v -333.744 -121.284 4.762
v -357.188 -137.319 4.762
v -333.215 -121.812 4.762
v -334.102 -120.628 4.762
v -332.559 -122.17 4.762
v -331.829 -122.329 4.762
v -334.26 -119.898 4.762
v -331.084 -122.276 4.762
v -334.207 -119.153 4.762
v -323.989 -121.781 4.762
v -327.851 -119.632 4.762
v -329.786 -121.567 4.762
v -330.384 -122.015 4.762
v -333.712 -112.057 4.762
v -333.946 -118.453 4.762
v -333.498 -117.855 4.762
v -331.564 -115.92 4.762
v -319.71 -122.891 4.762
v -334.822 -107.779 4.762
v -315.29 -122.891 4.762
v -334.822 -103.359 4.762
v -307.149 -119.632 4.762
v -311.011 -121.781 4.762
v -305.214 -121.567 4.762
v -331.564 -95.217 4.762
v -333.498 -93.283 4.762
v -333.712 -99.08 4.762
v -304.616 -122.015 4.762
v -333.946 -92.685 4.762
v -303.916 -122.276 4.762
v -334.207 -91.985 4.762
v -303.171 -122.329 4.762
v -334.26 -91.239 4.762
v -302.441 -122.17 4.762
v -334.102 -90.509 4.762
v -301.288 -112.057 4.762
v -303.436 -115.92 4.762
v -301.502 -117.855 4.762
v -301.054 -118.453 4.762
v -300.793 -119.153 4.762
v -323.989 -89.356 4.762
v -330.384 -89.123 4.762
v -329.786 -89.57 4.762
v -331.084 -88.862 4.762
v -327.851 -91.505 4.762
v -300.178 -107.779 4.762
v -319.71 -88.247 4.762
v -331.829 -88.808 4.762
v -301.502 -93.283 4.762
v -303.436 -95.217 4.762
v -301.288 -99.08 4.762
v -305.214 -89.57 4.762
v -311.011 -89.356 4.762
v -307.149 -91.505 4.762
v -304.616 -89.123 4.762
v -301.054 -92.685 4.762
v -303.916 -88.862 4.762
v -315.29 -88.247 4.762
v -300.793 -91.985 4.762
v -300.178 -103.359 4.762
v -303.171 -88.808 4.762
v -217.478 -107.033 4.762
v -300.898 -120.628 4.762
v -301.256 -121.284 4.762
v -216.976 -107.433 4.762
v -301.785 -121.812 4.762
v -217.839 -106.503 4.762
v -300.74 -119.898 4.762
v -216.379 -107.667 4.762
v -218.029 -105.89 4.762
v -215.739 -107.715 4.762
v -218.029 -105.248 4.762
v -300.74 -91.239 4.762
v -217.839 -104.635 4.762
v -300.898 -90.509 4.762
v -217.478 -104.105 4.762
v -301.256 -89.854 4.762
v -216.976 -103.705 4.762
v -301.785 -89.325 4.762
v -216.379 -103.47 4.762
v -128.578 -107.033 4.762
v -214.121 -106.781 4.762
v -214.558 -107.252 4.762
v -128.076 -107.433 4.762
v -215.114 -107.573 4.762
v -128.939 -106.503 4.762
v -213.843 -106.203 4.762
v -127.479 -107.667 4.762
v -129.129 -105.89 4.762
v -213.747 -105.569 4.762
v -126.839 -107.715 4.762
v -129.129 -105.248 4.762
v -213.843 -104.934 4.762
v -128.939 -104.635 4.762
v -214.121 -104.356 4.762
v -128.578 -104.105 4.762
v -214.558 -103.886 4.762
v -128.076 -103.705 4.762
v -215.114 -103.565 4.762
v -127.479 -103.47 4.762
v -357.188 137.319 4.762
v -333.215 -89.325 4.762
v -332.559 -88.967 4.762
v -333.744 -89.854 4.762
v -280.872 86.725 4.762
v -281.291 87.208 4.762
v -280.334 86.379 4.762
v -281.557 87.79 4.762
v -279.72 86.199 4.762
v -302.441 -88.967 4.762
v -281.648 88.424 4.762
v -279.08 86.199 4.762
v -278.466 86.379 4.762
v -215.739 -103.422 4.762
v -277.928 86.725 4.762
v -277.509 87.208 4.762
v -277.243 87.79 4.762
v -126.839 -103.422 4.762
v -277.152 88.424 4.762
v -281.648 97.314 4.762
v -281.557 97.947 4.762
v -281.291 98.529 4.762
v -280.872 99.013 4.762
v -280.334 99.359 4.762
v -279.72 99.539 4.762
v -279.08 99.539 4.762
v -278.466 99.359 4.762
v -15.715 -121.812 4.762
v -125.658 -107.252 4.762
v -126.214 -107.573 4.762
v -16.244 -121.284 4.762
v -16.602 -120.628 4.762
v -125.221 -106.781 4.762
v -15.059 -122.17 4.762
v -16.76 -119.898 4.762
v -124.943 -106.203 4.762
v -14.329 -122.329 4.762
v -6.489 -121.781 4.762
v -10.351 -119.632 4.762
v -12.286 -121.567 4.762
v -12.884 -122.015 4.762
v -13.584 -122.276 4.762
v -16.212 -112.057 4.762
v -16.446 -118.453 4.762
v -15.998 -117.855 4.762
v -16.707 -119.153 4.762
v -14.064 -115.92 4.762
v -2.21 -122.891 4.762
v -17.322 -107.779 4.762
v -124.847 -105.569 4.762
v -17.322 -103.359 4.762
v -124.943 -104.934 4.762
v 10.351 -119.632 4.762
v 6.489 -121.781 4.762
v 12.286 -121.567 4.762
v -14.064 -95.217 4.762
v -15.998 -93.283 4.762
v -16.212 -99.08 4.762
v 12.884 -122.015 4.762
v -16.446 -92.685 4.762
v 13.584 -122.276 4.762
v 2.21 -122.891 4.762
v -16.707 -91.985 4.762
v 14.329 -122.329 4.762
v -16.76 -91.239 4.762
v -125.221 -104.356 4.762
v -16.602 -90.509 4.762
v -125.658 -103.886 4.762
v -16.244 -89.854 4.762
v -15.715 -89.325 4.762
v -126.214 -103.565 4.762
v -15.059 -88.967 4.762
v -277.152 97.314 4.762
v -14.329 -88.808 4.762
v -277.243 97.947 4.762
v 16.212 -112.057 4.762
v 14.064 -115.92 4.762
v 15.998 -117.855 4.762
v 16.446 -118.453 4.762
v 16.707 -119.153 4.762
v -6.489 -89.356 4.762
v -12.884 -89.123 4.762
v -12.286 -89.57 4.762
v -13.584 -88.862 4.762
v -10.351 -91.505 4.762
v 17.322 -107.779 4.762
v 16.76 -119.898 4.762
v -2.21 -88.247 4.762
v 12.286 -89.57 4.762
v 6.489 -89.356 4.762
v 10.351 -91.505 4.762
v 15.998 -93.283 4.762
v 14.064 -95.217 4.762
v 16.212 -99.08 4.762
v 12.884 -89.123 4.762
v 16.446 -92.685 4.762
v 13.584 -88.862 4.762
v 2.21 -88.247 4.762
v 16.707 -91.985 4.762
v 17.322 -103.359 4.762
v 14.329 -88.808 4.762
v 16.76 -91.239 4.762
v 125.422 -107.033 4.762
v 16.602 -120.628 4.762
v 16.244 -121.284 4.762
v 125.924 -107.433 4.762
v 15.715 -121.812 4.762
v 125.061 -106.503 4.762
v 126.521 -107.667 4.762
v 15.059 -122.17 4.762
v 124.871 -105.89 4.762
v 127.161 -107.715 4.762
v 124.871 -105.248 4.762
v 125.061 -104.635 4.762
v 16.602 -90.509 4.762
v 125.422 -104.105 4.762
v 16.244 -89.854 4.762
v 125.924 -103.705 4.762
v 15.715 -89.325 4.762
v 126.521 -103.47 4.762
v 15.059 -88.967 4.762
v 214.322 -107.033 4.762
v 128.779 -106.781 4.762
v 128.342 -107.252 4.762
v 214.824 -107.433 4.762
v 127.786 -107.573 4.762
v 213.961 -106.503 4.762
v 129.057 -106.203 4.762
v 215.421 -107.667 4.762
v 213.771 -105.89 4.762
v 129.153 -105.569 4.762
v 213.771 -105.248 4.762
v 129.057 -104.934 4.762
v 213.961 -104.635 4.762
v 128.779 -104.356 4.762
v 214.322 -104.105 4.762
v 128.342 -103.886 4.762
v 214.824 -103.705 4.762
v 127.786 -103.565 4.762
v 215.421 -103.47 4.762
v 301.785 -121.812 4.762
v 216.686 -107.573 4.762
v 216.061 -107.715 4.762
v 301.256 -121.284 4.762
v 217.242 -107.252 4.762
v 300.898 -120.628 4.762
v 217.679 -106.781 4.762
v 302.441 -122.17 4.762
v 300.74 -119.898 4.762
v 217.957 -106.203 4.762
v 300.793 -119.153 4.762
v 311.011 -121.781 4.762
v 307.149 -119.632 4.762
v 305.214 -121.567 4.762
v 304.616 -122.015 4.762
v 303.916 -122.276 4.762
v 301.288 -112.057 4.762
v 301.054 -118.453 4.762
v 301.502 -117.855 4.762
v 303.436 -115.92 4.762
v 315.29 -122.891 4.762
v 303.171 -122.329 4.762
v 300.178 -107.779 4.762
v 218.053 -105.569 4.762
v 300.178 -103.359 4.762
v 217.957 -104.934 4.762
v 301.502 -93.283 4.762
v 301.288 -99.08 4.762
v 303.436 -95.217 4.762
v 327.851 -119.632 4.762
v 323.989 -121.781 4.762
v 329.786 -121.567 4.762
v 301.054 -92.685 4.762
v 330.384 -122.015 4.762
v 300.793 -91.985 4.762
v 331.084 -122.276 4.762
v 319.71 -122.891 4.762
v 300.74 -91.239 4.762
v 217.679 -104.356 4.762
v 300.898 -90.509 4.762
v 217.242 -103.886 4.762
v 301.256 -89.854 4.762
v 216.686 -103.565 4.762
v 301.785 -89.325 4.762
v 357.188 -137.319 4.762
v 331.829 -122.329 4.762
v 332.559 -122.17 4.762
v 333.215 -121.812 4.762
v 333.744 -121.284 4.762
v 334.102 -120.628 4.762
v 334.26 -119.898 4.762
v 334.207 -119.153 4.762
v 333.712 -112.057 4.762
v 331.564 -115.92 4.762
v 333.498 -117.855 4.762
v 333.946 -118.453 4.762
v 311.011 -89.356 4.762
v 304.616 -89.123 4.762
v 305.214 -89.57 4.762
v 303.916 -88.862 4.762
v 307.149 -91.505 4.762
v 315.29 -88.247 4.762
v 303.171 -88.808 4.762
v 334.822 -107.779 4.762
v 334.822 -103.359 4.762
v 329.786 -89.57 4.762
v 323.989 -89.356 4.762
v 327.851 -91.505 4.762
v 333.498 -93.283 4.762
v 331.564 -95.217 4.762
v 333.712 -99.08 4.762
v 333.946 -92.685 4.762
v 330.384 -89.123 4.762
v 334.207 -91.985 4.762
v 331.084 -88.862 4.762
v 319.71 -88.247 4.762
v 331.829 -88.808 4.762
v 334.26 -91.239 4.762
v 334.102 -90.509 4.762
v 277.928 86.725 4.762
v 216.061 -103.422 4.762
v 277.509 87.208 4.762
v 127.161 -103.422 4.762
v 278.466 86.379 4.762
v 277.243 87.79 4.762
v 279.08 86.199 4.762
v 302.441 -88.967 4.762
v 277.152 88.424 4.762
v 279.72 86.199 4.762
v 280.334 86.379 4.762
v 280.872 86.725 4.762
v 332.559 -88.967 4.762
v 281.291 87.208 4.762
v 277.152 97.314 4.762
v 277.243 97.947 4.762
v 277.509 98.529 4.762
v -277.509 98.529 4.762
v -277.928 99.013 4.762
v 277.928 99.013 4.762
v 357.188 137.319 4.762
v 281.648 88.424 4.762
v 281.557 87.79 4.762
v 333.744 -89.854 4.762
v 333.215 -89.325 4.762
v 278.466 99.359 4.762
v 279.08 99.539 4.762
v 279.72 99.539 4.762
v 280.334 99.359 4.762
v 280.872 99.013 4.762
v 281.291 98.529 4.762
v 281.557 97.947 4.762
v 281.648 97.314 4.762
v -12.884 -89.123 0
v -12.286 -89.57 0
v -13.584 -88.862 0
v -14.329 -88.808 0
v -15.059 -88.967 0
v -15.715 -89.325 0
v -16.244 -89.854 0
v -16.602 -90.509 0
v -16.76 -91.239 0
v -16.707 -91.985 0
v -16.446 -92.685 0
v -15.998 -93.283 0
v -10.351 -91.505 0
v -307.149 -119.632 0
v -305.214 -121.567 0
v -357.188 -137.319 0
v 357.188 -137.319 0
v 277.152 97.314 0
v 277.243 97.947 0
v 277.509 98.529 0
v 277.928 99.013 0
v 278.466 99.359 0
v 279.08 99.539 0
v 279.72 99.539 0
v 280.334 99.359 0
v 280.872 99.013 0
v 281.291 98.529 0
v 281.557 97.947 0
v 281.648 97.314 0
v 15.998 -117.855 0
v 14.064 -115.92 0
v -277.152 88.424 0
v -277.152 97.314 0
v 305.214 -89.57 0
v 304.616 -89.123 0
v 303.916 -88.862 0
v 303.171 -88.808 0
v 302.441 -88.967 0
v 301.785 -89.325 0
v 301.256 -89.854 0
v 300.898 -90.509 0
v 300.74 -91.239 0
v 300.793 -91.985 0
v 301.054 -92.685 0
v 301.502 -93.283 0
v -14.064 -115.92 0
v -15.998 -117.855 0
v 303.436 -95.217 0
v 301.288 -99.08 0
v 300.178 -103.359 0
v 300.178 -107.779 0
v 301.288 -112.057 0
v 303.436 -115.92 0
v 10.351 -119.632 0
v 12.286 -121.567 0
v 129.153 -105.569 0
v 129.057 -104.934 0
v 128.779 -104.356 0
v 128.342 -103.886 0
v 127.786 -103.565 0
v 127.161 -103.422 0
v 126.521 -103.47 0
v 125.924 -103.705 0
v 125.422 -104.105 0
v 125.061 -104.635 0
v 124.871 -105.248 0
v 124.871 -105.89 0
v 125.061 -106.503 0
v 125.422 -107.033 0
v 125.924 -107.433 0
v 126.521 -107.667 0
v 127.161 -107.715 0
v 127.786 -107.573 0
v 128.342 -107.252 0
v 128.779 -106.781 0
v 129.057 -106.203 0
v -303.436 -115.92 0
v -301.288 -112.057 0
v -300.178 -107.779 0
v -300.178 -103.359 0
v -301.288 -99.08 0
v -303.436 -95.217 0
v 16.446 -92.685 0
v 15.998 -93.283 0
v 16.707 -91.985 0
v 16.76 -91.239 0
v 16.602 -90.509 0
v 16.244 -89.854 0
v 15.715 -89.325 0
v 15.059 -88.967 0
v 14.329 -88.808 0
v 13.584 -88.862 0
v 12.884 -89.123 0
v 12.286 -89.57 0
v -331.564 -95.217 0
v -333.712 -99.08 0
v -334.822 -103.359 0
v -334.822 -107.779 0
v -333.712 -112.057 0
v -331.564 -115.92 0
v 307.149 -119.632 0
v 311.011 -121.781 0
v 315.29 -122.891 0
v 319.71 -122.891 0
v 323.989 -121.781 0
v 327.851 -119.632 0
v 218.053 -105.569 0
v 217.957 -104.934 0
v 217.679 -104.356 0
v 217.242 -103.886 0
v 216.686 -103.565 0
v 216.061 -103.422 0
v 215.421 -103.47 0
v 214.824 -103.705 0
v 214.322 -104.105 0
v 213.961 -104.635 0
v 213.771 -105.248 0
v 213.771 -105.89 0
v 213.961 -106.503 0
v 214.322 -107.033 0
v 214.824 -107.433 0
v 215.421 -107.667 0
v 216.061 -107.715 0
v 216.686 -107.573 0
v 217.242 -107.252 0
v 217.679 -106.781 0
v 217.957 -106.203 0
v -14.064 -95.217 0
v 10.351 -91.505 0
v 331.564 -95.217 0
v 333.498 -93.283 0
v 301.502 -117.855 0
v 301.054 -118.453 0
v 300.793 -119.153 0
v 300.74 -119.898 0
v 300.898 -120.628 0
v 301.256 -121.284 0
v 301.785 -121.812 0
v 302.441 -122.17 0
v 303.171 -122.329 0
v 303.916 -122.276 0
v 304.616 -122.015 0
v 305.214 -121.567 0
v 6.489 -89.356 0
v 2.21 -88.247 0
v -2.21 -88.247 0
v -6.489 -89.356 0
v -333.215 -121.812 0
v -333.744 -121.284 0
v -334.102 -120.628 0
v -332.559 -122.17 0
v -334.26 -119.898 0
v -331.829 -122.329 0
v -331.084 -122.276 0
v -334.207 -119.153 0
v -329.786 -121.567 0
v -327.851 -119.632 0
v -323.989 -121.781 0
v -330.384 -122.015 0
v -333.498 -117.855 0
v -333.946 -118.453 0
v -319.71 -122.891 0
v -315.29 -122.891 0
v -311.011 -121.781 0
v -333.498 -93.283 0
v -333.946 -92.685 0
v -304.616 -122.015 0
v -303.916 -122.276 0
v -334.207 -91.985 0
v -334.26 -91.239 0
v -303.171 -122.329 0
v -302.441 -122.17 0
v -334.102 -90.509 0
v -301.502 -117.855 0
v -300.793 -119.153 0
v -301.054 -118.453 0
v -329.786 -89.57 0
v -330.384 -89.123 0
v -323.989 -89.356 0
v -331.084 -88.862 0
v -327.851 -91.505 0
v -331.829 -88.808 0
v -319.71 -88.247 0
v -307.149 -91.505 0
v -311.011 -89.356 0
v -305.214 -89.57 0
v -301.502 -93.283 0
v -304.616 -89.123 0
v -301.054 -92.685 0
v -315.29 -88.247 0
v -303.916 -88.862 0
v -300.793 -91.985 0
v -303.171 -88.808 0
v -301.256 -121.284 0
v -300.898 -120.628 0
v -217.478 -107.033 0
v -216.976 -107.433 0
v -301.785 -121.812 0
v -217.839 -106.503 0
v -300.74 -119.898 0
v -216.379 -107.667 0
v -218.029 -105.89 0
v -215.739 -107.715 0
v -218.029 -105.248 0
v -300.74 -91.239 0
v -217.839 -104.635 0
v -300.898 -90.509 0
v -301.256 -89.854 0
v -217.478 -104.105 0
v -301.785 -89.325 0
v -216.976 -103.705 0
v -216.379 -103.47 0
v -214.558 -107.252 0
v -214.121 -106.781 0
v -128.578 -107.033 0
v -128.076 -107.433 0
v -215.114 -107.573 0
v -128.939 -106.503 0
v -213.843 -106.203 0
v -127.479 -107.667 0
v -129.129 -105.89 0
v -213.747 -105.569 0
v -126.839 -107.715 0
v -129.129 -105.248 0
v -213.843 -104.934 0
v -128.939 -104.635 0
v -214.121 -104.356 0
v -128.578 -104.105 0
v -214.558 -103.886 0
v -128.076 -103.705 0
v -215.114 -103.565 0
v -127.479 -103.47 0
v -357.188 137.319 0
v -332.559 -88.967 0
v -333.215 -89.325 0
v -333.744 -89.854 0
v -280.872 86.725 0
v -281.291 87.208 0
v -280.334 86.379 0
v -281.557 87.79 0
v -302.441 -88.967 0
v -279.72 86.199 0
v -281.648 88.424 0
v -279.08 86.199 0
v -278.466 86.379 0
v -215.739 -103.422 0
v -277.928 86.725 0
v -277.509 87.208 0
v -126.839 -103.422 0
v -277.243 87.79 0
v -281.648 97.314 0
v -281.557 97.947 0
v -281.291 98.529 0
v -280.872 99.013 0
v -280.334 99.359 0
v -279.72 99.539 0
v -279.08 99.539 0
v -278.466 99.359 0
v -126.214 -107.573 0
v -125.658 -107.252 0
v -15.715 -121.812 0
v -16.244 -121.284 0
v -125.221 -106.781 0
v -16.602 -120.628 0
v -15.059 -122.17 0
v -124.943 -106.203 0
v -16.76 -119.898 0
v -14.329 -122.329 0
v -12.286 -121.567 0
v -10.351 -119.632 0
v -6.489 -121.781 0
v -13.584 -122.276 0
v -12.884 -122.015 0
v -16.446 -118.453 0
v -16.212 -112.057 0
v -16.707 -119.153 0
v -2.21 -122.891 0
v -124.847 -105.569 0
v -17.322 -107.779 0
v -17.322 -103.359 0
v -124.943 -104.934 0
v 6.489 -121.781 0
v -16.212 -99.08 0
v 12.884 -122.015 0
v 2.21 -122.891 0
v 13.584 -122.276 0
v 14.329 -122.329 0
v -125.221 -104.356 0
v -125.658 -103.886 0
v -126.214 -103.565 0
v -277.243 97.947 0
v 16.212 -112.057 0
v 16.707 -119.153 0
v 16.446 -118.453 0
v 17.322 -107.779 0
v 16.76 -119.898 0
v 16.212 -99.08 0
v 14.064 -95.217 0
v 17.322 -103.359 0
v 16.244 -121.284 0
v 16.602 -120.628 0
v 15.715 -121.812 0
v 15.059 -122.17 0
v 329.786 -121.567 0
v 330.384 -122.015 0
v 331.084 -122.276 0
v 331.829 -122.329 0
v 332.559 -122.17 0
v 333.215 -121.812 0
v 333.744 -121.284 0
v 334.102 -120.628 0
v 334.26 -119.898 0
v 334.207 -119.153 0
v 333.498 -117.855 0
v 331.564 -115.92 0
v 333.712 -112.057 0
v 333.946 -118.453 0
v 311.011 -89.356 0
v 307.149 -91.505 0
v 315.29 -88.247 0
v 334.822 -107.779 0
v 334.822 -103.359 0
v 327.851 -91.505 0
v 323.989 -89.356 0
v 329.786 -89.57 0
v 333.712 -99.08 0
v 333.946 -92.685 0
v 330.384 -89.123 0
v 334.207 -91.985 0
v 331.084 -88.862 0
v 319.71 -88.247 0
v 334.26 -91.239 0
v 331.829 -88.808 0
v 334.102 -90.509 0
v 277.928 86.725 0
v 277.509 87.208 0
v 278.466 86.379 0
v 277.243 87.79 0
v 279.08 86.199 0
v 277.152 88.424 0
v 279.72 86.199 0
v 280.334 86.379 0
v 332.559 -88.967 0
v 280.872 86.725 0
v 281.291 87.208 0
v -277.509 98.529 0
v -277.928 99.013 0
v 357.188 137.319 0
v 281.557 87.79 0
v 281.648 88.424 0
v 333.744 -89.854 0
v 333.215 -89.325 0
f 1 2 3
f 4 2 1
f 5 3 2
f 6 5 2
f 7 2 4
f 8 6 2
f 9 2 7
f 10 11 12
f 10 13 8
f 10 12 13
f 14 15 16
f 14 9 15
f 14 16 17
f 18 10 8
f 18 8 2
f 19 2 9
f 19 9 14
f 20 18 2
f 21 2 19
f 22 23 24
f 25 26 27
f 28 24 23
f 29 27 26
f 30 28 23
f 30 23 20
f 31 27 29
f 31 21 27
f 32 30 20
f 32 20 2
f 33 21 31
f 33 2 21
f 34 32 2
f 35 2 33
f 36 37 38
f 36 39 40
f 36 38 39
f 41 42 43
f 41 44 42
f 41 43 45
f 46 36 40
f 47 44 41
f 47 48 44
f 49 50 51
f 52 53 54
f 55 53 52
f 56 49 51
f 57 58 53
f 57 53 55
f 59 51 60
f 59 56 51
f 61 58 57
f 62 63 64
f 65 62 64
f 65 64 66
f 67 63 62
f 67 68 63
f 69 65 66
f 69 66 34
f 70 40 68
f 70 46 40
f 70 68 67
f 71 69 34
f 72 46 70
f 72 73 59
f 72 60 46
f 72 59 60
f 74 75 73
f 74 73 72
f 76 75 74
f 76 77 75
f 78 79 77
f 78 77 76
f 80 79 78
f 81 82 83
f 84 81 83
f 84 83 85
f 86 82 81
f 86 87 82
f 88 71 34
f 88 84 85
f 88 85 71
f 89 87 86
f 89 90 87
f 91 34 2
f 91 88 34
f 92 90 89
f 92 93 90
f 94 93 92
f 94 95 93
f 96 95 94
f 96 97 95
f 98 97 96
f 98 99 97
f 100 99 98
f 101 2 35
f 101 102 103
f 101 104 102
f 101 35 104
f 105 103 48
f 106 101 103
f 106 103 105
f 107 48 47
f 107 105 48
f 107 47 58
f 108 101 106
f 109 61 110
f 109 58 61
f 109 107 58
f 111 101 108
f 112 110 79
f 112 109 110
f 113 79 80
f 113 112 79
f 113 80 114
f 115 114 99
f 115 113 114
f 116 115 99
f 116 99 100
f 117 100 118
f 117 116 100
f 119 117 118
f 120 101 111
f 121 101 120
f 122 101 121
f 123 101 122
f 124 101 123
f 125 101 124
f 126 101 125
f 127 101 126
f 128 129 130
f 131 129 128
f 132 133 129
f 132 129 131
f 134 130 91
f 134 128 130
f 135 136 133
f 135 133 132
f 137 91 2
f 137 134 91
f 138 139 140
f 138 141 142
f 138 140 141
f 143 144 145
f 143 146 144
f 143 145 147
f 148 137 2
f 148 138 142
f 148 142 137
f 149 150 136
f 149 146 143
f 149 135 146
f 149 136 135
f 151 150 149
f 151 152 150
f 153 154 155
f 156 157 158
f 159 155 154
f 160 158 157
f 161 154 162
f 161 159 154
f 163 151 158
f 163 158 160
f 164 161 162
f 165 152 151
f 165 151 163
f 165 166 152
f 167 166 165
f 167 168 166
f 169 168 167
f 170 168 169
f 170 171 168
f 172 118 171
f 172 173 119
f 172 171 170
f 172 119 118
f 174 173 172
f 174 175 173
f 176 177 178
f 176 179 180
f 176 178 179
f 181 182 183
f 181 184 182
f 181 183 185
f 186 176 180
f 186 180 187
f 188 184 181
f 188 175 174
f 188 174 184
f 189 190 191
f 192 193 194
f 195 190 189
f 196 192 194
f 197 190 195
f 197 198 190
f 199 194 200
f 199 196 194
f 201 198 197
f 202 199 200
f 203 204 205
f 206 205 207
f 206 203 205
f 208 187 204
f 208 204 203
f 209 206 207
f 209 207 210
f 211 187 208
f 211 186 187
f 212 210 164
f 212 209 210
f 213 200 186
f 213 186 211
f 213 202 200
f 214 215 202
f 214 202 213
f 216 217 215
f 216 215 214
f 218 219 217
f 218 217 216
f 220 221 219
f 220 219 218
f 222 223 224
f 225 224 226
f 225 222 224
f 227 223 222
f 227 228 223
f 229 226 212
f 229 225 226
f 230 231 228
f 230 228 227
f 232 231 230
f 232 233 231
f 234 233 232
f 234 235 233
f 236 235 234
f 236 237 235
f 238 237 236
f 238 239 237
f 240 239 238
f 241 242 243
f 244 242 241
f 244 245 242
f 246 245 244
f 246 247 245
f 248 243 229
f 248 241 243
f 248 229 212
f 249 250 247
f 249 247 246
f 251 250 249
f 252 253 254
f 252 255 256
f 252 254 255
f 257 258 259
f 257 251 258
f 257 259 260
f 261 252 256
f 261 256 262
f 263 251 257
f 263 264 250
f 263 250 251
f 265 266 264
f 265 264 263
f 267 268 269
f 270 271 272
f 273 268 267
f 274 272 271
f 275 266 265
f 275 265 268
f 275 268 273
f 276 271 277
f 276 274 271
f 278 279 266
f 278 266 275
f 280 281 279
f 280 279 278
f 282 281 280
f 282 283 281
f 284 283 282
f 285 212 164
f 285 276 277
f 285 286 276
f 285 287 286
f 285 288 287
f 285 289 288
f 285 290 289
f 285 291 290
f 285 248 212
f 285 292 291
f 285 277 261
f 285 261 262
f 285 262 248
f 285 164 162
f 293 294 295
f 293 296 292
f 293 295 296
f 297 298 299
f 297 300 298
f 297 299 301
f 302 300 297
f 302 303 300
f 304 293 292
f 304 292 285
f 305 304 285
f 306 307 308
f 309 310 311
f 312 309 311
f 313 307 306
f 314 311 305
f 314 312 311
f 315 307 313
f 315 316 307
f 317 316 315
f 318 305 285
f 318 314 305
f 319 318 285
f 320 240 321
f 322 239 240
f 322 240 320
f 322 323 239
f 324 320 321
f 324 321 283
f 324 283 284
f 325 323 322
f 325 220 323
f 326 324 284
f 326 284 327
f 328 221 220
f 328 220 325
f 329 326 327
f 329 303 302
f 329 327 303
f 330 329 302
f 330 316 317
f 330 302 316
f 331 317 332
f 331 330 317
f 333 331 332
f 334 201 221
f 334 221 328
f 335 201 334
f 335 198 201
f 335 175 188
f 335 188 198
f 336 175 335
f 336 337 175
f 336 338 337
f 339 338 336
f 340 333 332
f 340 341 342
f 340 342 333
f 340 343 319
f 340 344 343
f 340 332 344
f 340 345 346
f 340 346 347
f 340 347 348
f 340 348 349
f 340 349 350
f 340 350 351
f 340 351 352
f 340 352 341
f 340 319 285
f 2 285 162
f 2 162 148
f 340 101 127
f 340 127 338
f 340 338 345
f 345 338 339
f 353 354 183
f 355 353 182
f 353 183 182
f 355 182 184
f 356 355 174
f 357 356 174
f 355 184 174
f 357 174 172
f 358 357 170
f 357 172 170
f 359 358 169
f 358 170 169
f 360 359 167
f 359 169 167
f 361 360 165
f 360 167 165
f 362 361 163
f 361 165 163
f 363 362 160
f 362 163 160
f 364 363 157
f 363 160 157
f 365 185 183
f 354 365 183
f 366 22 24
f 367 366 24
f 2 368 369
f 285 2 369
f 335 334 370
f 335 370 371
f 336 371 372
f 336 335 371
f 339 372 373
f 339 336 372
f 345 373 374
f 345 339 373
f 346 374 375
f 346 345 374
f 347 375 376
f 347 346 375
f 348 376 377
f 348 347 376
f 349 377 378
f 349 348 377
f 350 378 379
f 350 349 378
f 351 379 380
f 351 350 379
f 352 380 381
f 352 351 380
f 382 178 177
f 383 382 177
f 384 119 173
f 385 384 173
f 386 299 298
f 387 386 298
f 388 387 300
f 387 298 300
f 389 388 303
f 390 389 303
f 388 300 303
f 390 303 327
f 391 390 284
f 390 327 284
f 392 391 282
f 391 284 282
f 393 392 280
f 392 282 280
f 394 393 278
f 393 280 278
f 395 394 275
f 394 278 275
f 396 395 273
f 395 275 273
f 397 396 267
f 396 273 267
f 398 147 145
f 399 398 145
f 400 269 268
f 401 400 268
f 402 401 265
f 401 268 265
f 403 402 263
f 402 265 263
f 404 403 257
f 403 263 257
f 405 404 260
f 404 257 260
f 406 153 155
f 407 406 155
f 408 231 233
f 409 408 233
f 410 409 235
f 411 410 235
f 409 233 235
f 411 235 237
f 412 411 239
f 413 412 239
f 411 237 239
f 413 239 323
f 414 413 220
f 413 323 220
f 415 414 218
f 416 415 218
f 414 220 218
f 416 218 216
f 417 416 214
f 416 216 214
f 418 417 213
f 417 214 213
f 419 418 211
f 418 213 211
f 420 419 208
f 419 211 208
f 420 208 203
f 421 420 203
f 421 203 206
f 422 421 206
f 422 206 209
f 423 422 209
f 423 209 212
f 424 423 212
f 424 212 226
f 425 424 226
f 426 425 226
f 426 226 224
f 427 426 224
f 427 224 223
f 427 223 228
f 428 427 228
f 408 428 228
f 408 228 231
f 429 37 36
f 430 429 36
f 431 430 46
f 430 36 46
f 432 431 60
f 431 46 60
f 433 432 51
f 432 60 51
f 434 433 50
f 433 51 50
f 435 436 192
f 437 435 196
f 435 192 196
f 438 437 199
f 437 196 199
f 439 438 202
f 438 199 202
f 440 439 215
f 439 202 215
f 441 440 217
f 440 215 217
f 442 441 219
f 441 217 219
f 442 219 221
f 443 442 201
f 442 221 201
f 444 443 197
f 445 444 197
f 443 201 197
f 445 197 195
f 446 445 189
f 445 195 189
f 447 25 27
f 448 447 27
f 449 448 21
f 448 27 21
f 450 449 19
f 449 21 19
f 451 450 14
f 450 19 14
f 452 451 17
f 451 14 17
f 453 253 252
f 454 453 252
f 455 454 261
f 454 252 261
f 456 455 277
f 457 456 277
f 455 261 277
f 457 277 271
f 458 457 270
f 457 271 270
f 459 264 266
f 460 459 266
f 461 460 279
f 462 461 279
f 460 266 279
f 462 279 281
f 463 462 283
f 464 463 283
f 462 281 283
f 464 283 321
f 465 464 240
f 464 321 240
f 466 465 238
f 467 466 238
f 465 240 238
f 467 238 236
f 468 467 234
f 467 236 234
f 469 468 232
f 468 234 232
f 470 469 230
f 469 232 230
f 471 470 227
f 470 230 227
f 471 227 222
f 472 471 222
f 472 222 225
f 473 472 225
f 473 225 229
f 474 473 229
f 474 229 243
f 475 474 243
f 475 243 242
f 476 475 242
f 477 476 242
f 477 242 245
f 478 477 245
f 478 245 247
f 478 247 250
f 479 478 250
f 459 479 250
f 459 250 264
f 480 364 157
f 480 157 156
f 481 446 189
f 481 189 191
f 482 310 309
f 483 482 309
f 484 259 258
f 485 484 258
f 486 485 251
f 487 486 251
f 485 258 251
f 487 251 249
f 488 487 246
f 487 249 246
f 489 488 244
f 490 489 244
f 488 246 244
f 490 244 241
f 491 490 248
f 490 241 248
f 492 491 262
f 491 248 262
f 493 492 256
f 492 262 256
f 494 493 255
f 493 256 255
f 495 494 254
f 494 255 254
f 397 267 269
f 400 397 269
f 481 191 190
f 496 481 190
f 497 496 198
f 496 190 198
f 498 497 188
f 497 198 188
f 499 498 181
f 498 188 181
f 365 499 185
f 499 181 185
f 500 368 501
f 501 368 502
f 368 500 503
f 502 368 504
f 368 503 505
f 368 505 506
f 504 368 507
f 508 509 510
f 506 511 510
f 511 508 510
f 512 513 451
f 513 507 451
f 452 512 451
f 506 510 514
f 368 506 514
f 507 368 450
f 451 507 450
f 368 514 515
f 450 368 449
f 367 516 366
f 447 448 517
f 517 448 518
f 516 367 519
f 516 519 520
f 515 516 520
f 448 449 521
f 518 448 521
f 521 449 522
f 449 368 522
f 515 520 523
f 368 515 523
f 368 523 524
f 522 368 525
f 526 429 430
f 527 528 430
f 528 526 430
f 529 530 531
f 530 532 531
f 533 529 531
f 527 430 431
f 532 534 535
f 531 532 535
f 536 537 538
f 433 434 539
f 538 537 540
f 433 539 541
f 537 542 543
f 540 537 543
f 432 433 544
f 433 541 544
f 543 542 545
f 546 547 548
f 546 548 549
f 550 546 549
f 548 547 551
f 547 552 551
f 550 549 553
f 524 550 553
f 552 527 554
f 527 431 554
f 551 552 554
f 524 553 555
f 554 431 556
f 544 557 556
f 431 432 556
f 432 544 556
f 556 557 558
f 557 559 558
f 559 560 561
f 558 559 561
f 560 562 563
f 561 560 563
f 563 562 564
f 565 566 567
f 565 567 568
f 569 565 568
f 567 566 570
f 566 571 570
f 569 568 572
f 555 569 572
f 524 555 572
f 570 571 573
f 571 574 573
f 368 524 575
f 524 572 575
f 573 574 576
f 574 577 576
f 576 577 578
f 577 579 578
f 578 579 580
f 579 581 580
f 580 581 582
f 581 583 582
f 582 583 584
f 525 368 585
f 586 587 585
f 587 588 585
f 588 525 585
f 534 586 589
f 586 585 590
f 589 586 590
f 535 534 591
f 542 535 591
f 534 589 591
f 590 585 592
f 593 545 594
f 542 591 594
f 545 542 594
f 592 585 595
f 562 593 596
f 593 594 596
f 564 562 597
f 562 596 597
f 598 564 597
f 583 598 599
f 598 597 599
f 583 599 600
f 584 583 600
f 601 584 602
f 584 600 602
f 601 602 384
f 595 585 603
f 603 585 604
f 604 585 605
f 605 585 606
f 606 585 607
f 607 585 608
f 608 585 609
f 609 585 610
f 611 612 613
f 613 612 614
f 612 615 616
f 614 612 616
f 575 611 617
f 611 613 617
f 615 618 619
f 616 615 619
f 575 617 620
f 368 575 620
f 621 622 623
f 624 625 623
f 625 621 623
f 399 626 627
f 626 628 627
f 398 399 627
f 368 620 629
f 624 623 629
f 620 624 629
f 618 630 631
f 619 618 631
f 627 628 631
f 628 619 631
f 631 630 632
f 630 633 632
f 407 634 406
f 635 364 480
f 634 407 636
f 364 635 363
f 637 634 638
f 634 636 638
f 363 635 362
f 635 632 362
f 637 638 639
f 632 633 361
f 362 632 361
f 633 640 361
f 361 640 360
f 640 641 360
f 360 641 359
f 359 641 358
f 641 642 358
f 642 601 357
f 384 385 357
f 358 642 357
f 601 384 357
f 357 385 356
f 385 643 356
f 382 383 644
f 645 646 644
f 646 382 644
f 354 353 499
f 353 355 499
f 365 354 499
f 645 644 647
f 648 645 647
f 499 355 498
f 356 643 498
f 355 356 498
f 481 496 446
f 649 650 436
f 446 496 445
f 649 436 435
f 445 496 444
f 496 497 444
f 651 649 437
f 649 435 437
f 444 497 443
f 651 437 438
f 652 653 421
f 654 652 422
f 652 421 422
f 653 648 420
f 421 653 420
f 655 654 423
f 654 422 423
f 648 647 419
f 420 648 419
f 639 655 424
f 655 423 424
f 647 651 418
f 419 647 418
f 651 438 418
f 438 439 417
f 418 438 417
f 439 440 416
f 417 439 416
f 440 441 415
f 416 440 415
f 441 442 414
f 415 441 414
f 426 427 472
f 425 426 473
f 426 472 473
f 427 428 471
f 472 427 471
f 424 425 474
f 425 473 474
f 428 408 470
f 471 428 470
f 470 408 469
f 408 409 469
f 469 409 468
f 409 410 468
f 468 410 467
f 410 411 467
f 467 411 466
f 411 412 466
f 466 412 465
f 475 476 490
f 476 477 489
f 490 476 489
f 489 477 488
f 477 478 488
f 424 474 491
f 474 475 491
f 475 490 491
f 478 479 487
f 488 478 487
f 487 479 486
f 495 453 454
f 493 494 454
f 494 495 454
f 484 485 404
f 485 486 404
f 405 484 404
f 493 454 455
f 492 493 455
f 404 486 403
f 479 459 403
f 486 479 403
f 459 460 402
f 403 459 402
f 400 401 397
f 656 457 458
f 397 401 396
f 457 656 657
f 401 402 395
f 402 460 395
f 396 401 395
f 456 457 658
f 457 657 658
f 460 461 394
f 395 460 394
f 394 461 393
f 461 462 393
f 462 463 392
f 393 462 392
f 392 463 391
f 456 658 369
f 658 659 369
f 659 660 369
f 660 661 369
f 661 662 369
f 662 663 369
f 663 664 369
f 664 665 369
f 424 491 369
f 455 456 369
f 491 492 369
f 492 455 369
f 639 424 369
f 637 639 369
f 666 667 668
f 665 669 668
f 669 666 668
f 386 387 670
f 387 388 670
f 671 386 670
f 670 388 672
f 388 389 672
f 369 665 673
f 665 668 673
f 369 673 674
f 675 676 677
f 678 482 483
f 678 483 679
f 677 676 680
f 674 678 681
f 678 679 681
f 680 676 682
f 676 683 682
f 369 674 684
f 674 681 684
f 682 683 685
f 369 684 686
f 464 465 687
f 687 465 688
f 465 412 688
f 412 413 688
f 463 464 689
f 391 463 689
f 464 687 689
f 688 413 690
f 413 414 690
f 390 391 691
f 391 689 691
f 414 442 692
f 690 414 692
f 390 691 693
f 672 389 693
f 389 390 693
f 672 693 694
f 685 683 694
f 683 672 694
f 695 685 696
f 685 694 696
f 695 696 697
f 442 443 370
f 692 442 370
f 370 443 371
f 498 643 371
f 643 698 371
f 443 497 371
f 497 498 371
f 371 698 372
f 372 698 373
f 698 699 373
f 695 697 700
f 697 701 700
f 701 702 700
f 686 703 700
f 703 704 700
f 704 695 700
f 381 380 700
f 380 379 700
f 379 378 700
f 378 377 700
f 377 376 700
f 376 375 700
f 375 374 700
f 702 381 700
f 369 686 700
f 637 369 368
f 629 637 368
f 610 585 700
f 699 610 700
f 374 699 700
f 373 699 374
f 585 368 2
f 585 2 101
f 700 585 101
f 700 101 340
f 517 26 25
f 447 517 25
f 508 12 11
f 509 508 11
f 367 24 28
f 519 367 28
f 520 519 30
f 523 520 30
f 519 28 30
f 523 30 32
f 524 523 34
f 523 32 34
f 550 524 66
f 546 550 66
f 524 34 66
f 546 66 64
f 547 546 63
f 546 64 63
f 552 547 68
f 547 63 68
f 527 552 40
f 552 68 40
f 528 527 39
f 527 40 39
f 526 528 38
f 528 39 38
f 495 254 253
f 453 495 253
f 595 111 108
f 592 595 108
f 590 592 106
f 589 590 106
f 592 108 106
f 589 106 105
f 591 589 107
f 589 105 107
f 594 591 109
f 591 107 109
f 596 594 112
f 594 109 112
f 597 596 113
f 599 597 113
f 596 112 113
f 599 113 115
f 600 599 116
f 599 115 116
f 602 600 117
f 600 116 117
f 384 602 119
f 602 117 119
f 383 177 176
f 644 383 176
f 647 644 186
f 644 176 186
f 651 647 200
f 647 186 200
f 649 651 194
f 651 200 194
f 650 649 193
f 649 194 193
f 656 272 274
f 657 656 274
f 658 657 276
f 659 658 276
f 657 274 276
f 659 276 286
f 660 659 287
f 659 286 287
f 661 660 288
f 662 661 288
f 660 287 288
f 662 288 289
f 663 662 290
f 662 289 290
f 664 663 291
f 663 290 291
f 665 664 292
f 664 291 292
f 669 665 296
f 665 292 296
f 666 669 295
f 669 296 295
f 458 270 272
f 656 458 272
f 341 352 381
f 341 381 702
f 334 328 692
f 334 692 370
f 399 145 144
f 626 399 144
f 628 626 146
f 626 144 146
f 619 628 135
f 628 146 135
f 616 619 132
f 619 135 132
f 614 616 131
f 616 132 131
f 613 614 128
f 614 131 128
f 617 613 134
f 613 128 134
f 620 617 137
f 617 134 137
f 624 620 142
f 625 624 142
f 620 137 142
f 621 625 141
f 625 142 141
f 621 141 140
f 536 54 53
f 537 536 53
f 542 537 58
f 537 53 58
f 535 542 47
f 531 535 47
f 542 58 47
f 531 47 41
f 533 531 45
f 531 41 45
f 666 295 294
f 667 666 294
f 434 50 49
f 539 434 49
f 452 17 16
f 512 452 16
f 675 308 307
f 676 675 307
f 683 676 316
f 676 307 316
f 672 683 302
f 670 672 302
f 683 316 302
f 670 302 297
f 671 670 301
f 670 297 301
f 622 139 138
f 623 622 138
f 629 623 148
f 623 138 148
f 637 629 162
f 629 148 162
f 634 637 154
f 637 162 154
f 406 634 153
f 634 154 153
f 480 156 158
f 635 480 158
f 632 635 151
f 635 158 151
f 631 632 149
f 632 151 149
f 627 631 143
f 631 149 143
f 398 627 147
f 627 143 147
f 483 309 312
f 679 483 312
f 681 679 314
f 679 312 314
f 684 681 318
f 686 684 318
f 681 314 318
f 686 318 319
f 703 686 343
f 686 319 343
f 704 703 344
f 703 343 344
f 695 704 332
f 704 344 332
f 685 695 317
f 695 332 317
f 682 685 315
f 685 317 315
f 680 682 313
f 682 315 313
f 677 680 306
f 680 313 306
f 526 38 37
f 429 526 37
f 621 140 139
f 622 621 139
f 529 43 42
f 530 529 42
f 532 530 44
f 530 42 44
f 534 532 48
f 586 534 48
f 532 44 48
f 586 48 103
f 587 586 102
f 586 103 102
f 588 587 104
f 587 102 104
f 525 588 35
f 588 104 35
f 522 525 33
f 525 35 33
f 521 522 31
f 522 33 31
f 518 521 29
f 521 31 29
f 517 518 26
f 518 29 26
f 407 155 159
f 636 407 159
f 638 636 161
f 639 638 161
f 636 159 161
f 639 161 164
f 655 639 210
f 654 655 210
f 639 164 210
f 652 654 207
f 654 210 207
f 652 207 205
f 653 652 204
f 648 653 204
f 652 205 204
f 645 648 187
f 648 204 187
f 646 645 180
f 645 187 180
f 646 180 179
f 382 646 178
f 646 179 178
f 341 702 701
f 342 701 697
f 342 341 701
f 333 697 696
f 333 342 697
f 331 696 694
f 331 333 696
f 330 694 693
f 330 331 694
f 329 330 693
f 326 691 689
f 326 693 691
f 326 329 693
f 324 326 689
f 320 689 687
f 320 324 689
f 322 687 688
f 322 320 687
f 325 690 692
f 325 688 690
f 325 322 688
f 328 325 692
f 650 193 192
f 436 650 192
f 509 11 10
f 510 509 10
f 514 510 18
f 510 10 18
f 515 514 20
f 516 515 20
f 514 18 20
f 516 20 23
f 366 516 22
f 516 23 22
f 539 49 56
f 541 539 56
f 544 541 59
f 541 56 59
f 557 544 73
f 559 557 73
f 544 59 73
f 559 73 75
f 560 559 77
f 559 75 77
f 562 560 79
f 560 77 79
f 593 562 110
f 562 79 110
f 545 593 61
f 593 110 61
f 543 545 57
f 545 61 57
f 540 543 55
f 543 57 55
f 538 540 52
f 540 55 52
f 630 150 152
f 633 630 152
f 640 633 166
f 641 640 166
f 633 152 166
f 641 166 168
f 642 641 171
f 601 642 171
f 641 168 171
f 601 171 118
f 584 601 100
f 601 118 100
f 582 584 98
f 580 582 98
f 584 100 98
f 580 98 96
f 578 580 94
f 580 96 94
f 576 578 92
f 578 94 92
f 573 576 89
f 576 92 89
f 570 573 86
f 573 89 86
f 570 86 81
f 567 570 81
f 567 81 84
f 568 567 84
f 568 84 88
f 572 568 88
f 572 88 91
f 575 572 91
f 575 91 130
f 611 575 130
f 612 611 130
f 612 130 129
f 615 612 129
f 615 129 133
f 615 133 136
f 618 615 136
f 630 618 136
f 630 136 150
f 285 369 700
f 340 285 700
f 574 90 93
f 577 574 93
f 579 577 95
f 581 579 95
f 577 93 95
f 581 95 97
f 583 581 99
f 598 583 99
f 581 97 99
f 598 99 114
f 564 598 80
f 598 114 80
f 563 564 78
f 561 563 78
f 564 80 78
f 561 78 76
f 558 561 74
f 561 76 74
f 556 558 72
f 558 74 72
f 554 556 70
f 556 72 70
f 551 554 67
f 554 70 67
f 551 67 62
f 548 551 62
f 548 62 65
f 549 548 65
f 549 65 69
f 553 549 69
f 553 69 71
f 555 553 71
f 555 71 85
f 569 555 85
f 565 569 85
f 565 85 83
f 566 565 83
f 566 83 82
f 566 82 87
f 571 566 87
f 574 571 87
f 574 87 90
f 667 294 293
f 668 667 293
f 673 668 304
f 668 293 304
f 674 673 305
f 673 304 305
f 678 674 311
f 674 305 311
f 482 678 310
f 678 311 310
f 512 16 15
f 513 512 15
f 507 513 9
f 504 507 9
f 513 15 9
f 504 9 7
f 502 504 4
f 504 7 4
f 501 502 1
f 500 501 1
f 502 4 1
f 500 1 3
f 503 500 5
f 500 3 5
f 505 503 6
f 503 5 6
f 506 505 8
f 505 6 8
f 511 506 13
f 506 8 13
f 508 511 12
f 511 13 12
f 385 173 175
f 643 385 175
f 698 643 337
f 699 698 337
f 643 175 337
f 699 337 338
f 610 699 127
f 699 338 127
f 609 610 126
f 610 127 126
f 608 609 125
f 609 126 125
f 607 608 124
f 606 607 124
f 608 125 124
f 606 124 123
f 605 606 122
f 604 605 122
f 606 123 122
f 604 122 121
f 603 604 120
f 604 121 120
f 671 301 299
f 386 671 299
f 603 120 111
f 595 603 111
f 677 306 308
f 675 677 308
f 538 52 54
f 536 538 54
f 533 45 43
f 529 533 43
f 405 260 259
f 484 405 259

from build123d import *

# Parameters (mm, degrees)
SKETCH1_W           = 714.375
SKETCH1_H           = 274.6375
BOSS_EXTRUDE1_DEPTH = 4.7625
CUT_EXTRUDE1_DEPTH  = 5.7625
CUT_EXTRUDE3_DEPTH  = 5.7625
CUT_EXTRUDE4_REACH  = 6.763
SKETCH5_R           = 2.15265


with BuildPart() as part:
    # Sketch1 → Boss-Extrude1 (new body)
    with BuildSketch(Plane.XY):
        Rectangle(SKETCH1_W, SKETCH1_H)
    extrude(amount=BOSS_EXTRUDE1_DEPTH)

    # Sketch2 → Cut-Extrude1 (cut, through all)
    with BuildSketch(Plane.XY.offset(4.7625)):
        with BuildLine():
            Line((12.285980323, -89.570459076), (10.351389114, -91.505050285))
            ThreePointArc((10.351389114, -91.505050285), (0, -88.10625), (-10.351389114, -91.505050285))
            Line((-10.351389114, -91.505050285), (-12.285980323, -89.570459076))
            ThreePointArc((-12.285980323, -89.570459076), (-15.998290924, -89.570459076), (-15.998290924, -93.282769677))
            Line((-15.998290924, -93.282769677), (-14.063699715, -95.217360886))
            ThreePointArc((-14.063699715, -95.217360886), (-17.4625, -105.56875), (-14.063699715, -115.920139114))
            Line((-14.063699715, -115.920139114), (-15.998290924, -117.854730323))
            ThreePointArc((-15.998290924, -117.854730323), (-15.998290924, -121.567040924), (-12.285980323, -121.567040924))
            Line((-12.285980323, -121.567040924), (-10.351389114, -119.632449715))
            ThreePointArc((-10.351389114, -119.632449715), (0, -123.03125), (10.351389114, -119.632449715))
            Line((10.351389114, -119.632449715), (12.285980323, -121.567040924))
            ThreePointArc((12.285980323, -121.567040924), (15.998290924, -121.567040924), (15.998290924, -117.854730323))
            Line((15.998290924, -117.854730323), (14.063699715, -115.920139114))
            ThreePointArc((14.063699715, -115.920139114), (17.4625, -105.56875), (14.063699715, -95.217360886))
            Line((14.063699715, -95.217360886), (15.998290924, -93.282769677))
            ThreePointArc((15.998290924, -93.282769677), (15.998290924, -89.570459076), (12.285980323, -89.570459076))
        make_face()
        with BuildLine():
            Line((-305.214019677, -89.570459076), (-307.148610886, -91.505050285))
            ThreePointArc((-307.148610886, -91.505050285), (-317.5, -88.10625), (-327.851389114, -91.505050285))
            Line((-327.851389114, -91.505050285), (-329.785980323, -89.570459076))
            ThreePointArc((-329.785980323, -89.570459076), (-333.498290924, -89.570459076), (-333.498290924, -93.282769677))
            Line((-333.498290924, -93.282769677), (-331.563699715, -95.217360886))
            ThreePointArc((-331.563699715, -95.217360886), (-334.9625, -105.56875), (-331.563699715, -115.920139114))
            Line((-331.563699715, -115.920139114), (-333.498290924, -117.854730323))
            ThreePointArc((-333.498290924, -117.854730323), (-333.498290924, -121.567040924), (-329.785980323, -121.567040924))
            Line((-329.785980323, -121.567040924), (-327.851389114, -119.632449715))
            ThreePointArc((-327.851389114, -119.632449715), (-317.5, -123.03125), (-307.148610886, -119.632449715))
            Line((-307.148610886, -119.632449715), (-305.214019677, -121.567040924))
            ThreePointArc((-305.214019677, -121.567040924), (-301.501709076, -121.567040924), (-301.501709076, -117.854730323))
            Line((-301.501709076, -117.854730323), (-303.436300285, -115.920139114))
            ThreePointArc((-303.436300285, -115.920139114), (-300.0375, -105.56875), (-303.436300285, -95.217360886))
            Line((-303.436300285, -95.217360886), (-301.501709076, -93.282769677))
            ThreePointArc((-301.501709076, -93.282769677), (-301.501709076, -89.570459076), (-305.214019677, -89.570459076))
        make_face()
        with BuildLine():
            Line((329.785980323, -89.570459076), (327.851389114, -91.505050285))
            ThreePointArc((327.851389114, -91.505050285), (317.5, -88.10625), (307.148610886, -91.505050285))
            Line((307.148610886, -91.505050285), (305.214019677, -89.570459076))
            ThreePointArc((305.214019677, -89.570459076), (301.501709076, -89.570459076), (301.501709076, -93.282769677))
            Line((301.501709076, -93.282769677), (303.436300285, -95.217360886))
            ThreePointArc((303.436300285, -95.217360886), (300.0375, -105.56875), (303.436300285, -115.920139114))
            Line((303.436300285, -115.920139114), (301.501709076, -117.854730323))
            ThreePointArc((301.501709076, -117.854730323), (301.501709076, -121.567040924), (305.214019677, -121.567040924))
            Line((305.214019677, -121.567040924), (307.148610886, -119.632449715))
            ThreePointArc((307.148610886, -119.632449715), (317.5, -123.03125), (327.851389114, -119.632449715))
            Line((327.851389114, -119.632449715), (329.785980323, -121.567040924))
            ThreePointArc((329.785980323, -121.567040924), (333.498290924, -121.567040924), (333.498290924, -117.854730323))
            Line((333.498290924, -117.854730323), (331.563699715, -115.920139114))
            ThreePointArc((331.563699715, -115.920139114), (334.9625, -105.56875), (331.563699715, -95.217360886))
            Line((331.563699715, -95.217360886), (333.498290924, -93.282769677))
            ThreePointArc((333.498290924, -93.282769677), (333.498290924, -89.570459076), (329.785980323, -89.570459076))
        make_face()
    extrude(amount=-CUT_EXTRUDE1_DEPTH, mode=Mode.SUBTRACT)

    # Sketch4 → Cut-Extrude3 (cut, through all)
    with BuildSketch(Plane.XY.offset(4.7625)):
        with BuildLine():
            Line((277.1521, 88.42375), (277.1521, 97.31375))
            ThreePointArc((277.1521, 97.31375), (279.4, 99.56165), (281.6479, 97.31375))
            Line((281.6479, 97.31375), (281.6479, 88.42375))
            ThreePointArc((281.6479, 88.42375), (279.4, 86.17585), (277.1521, 88.42375))
        make_face()
        with BuildLine():
            Line((-277.1521, 88.42375), (-277.1521, 97.31375))
            ThreePointArc((-277.1521, 97.31375), (-279.4, 99.56165), (-281.6479, 97.31375))
            Line((-281.6479, 97.31375), (-281.6479, 88.42375))
            ThreePointArc((-281.6479, 88.42375), (-279.4, 86.17585), (-277.1521, 88.42375))
        make_face()
    extrude(amount=-CUT_EXTRUDE3_DEPTH, mode=Mode.SUBTRACT)

    # Sketch5 → Cut-Extrude4 (cut, up to next)
    with BuildSketch(Plane.XY.offset(4.7625), mode=Mode.PRIVATE) as cut_extrude4_sk1:
        with Locations((-127, -105.56875)):
            Circle(SKETCH5_R)
    cut_extrude4_tool1 = extrude(cut_extrude4_sk1.sketch, amount=-CUT_EXTRUDE4_REACH, mode=Mode.PRIVATE) & part.part
    add(cut_extrude4_tool1.solids().sort_by_distance((-127, -105.56875, 4.7625))[0], mode=Mode.SUBTRACT)
    # Sketch5 → Cut-Extrude4 (cut, up to next)
    with BuildSketch(Plane.XY.offset(4.7625), mode=Mode.PRIVATE) as cut_extrude4_sk2:
        with Locations((-215.9, -105.56875)):
            Circle(SKETCH5_R)
    cut_extrude4_tool2 = extrude(cut_extrude4_sk2.sketch, amount=-CUT_EXTRUDE4_REACH, mode=Mode.PRIVATE) & part.part
    add(cut_extrude4_tool2.solids().sort_by_distance((-215.9, -105.56875, 4.7625))[0], mode=Mode.SUBTRACT)
    # Sketch5 → Cut-Extrude4 (cut, up to next)
    with BuildSketch(Plane.XY.offset(4.7625), mode=Mode.PRIVATE) as cut_extrude4_sk3:
        with Locations((215.9, -105.56875)):
            Circle(SKETCH5_R)
    cut_extrude4_tool3 = extrude(cut_extrude4_sk3.sketch, amount=-CUT_EXTRUDE4_REACH, mode=Mode.PRIVATE) & part.part
    add(cut_extrude4_tool3.solids().sort_by_distance((215.9, -105.56875, 4.7625))[0], mode=Mode.SUBTRACT)
    # Sketch5 → Cut-Extrude4 (cut, up to next)
    with BuildSketch(Plane.XY.offset(4.7625), mode=Mode.PRIVATE) as cut_extrude4_sk4:
        with Locations((127, -105.56875)):
            Circle(SKETCH5_R)
    cut_extrude4_tool4 = extrude(cut_extrude4_sk4.sketch, amount=-CUT_EXTRUDE4_REACH, mode=Mode.PRIVATE) & part.part
    add(cut_extrude4_tool4.solids().sort_by_distance((127, -105.56875, 4.7625))[0], mode=Mode.SUBTRACT)


solid = part.part
